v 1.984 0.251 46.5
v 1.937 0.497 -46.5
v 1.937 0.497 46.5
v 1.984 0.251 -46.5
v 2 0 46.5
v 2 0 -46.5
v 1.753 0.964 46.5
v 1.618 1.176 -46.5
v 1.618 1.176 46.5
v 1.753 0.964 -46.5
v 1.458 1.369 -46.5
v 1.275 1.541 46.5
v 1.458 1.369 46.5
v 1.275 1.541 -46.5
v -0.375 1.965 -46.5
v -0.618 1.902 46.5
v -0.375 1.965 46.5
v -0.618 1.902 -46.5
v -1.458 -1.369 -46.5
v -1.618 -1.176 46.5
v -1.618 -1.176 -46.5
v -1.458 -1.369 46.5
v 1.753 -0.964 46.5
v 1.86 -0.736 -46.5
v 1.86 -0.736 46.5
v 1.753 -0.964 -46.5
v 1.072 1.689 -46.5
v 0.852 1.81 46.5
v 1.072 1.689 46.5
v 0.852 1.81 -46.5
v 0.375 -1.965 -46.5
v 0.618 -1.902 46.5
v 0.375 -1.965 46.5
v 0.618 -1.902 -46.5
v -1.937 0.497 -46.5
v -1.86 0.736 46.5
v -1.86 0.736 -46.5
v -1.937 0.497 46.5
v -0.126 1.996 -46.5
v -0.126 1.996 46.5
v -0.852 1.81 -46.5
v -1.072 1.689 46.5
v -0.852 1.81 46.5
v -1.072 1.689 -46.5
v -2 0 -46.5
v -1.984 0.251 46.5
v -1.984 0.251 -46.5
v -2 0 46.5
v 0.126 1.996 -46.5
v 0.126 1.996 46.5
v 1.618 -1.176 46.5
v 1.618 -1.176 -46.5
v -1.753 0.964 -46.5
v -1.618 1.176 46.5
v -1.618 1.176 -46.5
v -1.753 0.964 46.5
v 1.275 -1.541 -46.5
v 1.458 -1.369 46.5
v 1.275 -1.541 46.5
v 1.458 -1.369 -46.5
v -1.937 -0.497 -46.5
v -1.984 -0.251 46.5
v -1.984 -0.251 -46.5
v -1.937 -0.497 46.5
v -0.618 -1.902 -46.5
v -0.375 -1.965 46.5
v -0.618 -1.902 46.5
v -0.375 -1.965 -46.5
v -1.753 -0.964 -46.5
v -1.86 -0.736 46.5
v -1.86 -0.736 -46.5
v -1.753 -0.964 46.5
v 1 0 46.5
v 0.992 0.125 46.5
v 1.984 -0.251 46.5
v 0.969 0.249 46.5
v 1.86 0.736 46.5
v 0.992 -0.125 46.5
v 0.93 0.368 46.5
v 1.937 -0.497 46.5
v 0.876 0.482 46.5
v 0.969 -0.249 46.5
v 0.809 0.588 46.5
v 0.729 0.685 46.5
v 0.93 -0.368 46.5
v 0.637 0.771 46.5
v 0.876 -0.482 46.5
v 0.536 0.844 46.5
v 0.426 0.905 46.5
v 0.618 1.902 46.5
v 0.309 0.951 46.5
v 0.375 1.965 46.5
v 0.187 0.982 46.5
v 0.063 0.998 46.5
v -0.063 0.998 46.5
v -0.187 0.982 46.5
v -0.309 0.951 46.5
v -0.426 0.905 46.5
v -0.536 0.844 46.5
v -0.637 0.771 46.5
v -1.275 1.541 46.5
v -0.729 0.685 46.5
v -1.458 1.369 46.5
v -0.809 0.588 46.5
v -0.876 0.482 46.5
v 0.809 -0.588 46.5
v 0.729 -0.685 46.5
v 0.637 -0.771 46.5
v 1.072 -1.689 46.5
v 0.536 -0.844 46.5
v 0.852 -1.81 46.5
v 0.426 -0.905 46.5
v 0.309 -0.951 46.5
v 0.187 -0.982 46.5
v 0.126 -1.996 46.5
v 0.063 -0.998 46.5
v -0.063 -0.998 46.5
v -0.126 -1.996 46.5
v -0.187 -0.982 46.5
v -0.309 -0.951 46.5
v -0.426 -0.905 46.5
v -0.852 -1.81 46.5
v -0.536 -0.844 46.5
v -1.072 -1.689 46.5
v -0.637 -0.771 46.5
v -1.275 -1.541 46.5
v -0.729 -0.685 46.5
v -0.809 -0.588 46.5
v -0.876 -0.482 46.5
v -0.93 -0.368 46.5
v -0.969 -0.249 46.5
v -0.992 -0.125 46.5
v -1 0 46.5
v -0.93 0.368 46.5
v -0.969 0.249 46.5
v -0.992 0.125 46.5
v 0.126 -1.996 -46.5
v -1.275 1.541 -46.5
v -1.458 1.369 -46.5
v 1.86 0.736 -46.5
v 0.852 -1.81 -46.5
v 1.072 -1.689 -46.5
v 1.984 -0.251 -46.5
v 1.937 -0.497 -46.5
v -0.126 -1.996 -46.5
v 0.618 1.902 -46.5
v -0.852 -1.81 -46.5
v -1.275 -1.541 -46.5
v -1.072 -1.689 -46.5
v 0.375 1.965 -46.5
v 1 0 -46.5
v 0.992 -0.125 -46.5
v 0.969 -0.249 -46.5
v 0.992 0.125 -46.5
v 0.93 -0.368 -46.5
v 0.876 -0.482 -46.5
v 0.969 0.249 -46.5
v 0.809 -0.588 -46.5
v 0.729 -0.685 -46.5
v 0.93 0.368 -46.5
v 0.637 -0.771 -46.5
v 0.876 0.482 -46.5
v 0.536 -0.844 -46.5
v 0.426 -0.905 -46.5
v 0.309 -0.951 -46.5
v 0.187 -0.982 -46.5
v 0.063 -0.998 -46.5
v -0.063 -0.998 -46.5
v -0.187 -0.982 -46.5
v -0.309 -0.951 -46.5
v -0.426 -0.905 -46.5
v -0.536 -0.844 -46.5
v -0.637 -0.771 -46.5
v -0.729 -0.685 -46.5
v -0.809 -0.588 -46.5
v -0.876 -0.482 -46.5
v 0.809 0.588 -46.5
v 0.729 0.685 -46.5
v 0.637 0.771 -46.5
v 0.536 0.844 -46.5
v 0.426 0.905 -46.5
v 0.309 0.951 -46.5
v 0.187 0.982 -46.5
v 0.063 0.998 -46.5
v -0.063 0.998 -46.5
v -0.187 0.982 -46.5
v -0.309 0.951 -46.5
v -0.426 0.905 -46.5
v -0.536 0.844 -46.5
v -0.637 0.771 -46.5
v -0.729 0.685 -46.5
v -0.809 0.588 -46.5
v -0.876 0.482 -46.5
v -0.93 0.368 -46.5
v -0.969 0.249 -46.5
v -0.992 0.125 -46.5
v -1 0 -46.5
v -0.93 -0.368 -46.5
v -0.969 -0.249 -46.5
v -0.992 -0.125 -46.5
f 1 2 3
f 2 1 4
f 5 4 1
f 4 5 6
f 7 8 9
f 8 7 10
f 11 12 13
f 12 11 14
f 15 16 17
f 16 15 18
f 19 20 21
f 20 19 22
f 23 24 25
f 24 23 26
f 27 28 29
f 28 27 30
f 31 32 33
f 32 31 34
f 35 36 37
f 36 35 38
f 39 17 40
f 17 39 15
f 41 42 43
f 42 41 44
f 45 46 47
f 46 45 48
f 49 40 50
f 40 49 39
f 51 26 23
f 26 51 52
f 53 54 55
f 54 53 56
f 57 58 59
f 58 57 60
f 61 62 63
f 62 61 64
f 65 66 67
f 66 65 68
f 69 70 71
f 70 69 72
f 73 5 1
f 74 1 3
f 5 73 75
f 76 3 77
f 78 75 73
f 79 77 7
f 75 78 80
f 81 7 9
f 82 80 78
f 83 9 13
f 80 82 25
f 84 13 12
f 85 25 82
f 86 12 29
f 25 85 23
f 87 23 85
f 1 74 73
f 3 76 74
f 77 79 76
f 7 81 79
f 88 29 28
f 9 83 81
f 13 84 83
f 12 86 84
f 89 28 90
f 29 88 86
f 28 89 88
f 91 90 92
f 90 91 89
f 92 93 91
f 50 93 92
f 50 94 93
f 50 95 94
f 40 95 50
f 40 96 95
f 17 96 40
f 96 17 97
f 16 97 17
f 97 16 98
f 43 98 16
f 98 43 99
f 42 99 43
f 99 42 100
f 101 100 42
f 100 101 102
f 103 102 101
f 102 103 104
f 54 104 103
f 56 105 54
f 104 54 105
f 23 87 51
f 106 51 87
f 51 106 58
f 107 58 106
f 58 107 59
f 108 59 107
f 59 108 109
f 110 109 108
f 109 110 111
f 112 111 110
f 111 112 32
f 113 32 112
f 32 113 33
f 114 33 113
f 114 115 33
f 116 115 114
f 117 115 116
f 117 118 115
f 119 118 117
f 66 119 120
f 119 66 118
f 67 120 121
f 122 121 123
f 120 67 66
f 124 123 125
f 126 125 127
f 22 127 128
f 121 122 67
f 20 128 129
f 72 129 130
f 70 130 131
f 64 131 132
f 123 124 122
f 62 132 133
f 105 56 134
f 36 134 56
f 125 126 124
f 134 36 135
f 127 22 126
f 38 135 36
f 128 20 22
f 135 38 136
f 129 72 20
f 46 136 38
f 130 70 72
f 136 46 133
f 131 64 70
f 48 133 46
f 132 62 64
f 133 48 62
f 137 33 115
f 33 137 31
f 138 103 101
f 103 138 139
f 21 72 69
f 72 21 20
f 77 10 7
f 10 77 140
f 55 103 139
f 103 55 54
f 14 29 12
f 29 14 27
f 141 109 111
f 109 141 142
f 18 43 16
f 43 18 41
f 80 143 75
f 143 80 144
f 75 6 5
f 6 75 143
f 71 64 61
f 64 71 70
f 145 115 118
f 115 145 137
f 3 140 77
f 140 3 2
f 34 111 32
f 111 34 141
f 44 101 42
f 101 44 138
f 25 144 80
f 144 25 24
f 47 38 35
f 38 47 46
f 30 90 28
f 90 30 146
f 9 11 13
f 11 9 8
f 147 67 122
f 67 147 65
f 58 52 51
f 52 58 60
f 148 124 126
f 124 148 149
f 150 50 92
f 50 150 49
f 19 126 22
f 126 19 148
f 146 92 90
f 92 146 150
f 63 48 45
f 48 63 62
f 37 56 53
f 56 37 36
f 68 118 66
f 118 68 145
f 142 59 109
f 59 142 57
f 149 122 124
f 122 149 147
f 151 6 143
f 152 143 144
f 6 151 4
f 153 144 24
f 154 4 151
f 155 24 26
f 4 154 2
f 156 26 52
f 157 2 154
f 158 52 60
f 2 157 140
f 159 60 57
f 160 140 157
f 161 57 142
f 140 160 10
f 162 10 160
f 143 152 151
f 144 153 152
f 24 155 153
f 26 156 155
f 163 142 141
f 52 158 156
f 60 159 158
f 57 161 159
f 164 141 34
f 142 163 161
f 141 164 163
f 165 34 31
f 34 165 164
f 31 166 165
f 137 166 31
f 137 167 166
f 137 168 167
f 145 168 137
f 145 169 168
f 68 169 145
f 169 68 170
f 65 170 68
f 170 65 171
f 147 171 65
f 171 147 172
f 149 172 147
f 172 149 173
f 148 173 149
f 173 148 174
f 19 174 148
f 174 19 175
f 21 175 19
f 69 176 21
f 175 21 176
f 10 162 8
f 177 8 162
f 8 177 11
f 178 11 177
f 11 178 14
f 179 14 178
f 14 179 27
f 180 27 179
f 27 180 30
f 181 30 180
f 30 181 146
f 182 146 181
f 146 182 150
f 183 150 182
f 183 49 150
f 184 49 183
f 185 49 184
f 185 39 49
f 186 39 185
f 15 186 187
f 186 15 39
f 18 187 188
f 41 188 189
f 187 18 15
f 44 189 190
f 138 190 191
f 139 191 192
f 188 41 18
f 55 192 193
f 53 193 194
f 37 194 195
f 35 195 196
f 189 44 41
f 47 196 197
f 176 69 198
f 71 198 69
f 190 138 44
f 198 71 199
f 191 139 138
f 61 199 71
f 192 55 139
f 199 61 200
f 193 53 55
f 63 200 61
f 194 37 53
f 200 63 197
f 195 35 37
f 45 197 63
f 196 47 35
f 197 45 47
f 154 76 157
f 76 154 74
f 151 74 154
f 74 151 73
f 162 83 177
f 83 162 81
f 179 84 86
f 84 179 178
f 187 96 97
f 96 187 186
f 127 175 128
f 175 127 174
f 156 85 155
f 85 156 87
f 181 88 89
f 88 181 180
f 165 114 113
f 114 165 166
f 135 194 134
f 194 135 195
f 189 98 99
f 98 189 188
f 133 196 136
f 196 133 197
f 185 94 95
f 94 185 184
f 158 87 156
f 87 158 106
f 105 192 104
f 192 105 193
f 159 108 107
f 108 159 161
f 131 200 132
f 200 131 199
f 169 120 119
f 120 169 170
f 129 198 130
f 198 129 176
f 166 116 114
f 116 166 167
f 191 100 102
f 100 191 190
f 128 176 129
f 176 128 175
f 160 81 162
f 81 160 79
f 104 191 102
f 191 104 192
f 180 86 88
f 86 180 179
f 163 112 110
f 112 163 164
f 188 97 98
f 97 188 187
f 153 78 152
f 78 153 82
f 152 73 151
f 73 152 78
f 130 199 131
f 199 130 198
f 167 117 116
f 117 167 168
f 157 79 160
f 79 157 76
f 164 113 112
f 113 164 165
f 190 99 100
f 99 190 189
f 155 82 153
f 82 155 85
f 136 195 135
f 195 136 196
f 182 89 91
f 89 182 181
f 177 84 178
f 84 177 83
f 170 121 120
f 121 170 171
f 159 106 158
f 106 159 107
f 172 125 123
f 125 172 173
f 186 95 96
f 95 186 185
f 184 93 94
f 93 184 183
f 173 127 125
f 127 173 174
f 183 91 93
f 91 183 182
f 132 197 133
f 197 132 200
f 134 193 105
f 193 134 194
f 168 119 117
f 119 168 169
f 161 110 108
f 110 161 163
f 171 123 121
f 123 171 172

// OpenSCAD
$fn = 50;


difference() {
	union() {
		translate(v = [0, 0, -46.5000000000]) {
			cylinder(h = 93, r = 2.0000000000);
		}
	}
	union() {
		translate(v = [0, 0, -100.0000000000]) {
			cylinder(h = 200, r = 1.0000000000);
		}
	}
}
